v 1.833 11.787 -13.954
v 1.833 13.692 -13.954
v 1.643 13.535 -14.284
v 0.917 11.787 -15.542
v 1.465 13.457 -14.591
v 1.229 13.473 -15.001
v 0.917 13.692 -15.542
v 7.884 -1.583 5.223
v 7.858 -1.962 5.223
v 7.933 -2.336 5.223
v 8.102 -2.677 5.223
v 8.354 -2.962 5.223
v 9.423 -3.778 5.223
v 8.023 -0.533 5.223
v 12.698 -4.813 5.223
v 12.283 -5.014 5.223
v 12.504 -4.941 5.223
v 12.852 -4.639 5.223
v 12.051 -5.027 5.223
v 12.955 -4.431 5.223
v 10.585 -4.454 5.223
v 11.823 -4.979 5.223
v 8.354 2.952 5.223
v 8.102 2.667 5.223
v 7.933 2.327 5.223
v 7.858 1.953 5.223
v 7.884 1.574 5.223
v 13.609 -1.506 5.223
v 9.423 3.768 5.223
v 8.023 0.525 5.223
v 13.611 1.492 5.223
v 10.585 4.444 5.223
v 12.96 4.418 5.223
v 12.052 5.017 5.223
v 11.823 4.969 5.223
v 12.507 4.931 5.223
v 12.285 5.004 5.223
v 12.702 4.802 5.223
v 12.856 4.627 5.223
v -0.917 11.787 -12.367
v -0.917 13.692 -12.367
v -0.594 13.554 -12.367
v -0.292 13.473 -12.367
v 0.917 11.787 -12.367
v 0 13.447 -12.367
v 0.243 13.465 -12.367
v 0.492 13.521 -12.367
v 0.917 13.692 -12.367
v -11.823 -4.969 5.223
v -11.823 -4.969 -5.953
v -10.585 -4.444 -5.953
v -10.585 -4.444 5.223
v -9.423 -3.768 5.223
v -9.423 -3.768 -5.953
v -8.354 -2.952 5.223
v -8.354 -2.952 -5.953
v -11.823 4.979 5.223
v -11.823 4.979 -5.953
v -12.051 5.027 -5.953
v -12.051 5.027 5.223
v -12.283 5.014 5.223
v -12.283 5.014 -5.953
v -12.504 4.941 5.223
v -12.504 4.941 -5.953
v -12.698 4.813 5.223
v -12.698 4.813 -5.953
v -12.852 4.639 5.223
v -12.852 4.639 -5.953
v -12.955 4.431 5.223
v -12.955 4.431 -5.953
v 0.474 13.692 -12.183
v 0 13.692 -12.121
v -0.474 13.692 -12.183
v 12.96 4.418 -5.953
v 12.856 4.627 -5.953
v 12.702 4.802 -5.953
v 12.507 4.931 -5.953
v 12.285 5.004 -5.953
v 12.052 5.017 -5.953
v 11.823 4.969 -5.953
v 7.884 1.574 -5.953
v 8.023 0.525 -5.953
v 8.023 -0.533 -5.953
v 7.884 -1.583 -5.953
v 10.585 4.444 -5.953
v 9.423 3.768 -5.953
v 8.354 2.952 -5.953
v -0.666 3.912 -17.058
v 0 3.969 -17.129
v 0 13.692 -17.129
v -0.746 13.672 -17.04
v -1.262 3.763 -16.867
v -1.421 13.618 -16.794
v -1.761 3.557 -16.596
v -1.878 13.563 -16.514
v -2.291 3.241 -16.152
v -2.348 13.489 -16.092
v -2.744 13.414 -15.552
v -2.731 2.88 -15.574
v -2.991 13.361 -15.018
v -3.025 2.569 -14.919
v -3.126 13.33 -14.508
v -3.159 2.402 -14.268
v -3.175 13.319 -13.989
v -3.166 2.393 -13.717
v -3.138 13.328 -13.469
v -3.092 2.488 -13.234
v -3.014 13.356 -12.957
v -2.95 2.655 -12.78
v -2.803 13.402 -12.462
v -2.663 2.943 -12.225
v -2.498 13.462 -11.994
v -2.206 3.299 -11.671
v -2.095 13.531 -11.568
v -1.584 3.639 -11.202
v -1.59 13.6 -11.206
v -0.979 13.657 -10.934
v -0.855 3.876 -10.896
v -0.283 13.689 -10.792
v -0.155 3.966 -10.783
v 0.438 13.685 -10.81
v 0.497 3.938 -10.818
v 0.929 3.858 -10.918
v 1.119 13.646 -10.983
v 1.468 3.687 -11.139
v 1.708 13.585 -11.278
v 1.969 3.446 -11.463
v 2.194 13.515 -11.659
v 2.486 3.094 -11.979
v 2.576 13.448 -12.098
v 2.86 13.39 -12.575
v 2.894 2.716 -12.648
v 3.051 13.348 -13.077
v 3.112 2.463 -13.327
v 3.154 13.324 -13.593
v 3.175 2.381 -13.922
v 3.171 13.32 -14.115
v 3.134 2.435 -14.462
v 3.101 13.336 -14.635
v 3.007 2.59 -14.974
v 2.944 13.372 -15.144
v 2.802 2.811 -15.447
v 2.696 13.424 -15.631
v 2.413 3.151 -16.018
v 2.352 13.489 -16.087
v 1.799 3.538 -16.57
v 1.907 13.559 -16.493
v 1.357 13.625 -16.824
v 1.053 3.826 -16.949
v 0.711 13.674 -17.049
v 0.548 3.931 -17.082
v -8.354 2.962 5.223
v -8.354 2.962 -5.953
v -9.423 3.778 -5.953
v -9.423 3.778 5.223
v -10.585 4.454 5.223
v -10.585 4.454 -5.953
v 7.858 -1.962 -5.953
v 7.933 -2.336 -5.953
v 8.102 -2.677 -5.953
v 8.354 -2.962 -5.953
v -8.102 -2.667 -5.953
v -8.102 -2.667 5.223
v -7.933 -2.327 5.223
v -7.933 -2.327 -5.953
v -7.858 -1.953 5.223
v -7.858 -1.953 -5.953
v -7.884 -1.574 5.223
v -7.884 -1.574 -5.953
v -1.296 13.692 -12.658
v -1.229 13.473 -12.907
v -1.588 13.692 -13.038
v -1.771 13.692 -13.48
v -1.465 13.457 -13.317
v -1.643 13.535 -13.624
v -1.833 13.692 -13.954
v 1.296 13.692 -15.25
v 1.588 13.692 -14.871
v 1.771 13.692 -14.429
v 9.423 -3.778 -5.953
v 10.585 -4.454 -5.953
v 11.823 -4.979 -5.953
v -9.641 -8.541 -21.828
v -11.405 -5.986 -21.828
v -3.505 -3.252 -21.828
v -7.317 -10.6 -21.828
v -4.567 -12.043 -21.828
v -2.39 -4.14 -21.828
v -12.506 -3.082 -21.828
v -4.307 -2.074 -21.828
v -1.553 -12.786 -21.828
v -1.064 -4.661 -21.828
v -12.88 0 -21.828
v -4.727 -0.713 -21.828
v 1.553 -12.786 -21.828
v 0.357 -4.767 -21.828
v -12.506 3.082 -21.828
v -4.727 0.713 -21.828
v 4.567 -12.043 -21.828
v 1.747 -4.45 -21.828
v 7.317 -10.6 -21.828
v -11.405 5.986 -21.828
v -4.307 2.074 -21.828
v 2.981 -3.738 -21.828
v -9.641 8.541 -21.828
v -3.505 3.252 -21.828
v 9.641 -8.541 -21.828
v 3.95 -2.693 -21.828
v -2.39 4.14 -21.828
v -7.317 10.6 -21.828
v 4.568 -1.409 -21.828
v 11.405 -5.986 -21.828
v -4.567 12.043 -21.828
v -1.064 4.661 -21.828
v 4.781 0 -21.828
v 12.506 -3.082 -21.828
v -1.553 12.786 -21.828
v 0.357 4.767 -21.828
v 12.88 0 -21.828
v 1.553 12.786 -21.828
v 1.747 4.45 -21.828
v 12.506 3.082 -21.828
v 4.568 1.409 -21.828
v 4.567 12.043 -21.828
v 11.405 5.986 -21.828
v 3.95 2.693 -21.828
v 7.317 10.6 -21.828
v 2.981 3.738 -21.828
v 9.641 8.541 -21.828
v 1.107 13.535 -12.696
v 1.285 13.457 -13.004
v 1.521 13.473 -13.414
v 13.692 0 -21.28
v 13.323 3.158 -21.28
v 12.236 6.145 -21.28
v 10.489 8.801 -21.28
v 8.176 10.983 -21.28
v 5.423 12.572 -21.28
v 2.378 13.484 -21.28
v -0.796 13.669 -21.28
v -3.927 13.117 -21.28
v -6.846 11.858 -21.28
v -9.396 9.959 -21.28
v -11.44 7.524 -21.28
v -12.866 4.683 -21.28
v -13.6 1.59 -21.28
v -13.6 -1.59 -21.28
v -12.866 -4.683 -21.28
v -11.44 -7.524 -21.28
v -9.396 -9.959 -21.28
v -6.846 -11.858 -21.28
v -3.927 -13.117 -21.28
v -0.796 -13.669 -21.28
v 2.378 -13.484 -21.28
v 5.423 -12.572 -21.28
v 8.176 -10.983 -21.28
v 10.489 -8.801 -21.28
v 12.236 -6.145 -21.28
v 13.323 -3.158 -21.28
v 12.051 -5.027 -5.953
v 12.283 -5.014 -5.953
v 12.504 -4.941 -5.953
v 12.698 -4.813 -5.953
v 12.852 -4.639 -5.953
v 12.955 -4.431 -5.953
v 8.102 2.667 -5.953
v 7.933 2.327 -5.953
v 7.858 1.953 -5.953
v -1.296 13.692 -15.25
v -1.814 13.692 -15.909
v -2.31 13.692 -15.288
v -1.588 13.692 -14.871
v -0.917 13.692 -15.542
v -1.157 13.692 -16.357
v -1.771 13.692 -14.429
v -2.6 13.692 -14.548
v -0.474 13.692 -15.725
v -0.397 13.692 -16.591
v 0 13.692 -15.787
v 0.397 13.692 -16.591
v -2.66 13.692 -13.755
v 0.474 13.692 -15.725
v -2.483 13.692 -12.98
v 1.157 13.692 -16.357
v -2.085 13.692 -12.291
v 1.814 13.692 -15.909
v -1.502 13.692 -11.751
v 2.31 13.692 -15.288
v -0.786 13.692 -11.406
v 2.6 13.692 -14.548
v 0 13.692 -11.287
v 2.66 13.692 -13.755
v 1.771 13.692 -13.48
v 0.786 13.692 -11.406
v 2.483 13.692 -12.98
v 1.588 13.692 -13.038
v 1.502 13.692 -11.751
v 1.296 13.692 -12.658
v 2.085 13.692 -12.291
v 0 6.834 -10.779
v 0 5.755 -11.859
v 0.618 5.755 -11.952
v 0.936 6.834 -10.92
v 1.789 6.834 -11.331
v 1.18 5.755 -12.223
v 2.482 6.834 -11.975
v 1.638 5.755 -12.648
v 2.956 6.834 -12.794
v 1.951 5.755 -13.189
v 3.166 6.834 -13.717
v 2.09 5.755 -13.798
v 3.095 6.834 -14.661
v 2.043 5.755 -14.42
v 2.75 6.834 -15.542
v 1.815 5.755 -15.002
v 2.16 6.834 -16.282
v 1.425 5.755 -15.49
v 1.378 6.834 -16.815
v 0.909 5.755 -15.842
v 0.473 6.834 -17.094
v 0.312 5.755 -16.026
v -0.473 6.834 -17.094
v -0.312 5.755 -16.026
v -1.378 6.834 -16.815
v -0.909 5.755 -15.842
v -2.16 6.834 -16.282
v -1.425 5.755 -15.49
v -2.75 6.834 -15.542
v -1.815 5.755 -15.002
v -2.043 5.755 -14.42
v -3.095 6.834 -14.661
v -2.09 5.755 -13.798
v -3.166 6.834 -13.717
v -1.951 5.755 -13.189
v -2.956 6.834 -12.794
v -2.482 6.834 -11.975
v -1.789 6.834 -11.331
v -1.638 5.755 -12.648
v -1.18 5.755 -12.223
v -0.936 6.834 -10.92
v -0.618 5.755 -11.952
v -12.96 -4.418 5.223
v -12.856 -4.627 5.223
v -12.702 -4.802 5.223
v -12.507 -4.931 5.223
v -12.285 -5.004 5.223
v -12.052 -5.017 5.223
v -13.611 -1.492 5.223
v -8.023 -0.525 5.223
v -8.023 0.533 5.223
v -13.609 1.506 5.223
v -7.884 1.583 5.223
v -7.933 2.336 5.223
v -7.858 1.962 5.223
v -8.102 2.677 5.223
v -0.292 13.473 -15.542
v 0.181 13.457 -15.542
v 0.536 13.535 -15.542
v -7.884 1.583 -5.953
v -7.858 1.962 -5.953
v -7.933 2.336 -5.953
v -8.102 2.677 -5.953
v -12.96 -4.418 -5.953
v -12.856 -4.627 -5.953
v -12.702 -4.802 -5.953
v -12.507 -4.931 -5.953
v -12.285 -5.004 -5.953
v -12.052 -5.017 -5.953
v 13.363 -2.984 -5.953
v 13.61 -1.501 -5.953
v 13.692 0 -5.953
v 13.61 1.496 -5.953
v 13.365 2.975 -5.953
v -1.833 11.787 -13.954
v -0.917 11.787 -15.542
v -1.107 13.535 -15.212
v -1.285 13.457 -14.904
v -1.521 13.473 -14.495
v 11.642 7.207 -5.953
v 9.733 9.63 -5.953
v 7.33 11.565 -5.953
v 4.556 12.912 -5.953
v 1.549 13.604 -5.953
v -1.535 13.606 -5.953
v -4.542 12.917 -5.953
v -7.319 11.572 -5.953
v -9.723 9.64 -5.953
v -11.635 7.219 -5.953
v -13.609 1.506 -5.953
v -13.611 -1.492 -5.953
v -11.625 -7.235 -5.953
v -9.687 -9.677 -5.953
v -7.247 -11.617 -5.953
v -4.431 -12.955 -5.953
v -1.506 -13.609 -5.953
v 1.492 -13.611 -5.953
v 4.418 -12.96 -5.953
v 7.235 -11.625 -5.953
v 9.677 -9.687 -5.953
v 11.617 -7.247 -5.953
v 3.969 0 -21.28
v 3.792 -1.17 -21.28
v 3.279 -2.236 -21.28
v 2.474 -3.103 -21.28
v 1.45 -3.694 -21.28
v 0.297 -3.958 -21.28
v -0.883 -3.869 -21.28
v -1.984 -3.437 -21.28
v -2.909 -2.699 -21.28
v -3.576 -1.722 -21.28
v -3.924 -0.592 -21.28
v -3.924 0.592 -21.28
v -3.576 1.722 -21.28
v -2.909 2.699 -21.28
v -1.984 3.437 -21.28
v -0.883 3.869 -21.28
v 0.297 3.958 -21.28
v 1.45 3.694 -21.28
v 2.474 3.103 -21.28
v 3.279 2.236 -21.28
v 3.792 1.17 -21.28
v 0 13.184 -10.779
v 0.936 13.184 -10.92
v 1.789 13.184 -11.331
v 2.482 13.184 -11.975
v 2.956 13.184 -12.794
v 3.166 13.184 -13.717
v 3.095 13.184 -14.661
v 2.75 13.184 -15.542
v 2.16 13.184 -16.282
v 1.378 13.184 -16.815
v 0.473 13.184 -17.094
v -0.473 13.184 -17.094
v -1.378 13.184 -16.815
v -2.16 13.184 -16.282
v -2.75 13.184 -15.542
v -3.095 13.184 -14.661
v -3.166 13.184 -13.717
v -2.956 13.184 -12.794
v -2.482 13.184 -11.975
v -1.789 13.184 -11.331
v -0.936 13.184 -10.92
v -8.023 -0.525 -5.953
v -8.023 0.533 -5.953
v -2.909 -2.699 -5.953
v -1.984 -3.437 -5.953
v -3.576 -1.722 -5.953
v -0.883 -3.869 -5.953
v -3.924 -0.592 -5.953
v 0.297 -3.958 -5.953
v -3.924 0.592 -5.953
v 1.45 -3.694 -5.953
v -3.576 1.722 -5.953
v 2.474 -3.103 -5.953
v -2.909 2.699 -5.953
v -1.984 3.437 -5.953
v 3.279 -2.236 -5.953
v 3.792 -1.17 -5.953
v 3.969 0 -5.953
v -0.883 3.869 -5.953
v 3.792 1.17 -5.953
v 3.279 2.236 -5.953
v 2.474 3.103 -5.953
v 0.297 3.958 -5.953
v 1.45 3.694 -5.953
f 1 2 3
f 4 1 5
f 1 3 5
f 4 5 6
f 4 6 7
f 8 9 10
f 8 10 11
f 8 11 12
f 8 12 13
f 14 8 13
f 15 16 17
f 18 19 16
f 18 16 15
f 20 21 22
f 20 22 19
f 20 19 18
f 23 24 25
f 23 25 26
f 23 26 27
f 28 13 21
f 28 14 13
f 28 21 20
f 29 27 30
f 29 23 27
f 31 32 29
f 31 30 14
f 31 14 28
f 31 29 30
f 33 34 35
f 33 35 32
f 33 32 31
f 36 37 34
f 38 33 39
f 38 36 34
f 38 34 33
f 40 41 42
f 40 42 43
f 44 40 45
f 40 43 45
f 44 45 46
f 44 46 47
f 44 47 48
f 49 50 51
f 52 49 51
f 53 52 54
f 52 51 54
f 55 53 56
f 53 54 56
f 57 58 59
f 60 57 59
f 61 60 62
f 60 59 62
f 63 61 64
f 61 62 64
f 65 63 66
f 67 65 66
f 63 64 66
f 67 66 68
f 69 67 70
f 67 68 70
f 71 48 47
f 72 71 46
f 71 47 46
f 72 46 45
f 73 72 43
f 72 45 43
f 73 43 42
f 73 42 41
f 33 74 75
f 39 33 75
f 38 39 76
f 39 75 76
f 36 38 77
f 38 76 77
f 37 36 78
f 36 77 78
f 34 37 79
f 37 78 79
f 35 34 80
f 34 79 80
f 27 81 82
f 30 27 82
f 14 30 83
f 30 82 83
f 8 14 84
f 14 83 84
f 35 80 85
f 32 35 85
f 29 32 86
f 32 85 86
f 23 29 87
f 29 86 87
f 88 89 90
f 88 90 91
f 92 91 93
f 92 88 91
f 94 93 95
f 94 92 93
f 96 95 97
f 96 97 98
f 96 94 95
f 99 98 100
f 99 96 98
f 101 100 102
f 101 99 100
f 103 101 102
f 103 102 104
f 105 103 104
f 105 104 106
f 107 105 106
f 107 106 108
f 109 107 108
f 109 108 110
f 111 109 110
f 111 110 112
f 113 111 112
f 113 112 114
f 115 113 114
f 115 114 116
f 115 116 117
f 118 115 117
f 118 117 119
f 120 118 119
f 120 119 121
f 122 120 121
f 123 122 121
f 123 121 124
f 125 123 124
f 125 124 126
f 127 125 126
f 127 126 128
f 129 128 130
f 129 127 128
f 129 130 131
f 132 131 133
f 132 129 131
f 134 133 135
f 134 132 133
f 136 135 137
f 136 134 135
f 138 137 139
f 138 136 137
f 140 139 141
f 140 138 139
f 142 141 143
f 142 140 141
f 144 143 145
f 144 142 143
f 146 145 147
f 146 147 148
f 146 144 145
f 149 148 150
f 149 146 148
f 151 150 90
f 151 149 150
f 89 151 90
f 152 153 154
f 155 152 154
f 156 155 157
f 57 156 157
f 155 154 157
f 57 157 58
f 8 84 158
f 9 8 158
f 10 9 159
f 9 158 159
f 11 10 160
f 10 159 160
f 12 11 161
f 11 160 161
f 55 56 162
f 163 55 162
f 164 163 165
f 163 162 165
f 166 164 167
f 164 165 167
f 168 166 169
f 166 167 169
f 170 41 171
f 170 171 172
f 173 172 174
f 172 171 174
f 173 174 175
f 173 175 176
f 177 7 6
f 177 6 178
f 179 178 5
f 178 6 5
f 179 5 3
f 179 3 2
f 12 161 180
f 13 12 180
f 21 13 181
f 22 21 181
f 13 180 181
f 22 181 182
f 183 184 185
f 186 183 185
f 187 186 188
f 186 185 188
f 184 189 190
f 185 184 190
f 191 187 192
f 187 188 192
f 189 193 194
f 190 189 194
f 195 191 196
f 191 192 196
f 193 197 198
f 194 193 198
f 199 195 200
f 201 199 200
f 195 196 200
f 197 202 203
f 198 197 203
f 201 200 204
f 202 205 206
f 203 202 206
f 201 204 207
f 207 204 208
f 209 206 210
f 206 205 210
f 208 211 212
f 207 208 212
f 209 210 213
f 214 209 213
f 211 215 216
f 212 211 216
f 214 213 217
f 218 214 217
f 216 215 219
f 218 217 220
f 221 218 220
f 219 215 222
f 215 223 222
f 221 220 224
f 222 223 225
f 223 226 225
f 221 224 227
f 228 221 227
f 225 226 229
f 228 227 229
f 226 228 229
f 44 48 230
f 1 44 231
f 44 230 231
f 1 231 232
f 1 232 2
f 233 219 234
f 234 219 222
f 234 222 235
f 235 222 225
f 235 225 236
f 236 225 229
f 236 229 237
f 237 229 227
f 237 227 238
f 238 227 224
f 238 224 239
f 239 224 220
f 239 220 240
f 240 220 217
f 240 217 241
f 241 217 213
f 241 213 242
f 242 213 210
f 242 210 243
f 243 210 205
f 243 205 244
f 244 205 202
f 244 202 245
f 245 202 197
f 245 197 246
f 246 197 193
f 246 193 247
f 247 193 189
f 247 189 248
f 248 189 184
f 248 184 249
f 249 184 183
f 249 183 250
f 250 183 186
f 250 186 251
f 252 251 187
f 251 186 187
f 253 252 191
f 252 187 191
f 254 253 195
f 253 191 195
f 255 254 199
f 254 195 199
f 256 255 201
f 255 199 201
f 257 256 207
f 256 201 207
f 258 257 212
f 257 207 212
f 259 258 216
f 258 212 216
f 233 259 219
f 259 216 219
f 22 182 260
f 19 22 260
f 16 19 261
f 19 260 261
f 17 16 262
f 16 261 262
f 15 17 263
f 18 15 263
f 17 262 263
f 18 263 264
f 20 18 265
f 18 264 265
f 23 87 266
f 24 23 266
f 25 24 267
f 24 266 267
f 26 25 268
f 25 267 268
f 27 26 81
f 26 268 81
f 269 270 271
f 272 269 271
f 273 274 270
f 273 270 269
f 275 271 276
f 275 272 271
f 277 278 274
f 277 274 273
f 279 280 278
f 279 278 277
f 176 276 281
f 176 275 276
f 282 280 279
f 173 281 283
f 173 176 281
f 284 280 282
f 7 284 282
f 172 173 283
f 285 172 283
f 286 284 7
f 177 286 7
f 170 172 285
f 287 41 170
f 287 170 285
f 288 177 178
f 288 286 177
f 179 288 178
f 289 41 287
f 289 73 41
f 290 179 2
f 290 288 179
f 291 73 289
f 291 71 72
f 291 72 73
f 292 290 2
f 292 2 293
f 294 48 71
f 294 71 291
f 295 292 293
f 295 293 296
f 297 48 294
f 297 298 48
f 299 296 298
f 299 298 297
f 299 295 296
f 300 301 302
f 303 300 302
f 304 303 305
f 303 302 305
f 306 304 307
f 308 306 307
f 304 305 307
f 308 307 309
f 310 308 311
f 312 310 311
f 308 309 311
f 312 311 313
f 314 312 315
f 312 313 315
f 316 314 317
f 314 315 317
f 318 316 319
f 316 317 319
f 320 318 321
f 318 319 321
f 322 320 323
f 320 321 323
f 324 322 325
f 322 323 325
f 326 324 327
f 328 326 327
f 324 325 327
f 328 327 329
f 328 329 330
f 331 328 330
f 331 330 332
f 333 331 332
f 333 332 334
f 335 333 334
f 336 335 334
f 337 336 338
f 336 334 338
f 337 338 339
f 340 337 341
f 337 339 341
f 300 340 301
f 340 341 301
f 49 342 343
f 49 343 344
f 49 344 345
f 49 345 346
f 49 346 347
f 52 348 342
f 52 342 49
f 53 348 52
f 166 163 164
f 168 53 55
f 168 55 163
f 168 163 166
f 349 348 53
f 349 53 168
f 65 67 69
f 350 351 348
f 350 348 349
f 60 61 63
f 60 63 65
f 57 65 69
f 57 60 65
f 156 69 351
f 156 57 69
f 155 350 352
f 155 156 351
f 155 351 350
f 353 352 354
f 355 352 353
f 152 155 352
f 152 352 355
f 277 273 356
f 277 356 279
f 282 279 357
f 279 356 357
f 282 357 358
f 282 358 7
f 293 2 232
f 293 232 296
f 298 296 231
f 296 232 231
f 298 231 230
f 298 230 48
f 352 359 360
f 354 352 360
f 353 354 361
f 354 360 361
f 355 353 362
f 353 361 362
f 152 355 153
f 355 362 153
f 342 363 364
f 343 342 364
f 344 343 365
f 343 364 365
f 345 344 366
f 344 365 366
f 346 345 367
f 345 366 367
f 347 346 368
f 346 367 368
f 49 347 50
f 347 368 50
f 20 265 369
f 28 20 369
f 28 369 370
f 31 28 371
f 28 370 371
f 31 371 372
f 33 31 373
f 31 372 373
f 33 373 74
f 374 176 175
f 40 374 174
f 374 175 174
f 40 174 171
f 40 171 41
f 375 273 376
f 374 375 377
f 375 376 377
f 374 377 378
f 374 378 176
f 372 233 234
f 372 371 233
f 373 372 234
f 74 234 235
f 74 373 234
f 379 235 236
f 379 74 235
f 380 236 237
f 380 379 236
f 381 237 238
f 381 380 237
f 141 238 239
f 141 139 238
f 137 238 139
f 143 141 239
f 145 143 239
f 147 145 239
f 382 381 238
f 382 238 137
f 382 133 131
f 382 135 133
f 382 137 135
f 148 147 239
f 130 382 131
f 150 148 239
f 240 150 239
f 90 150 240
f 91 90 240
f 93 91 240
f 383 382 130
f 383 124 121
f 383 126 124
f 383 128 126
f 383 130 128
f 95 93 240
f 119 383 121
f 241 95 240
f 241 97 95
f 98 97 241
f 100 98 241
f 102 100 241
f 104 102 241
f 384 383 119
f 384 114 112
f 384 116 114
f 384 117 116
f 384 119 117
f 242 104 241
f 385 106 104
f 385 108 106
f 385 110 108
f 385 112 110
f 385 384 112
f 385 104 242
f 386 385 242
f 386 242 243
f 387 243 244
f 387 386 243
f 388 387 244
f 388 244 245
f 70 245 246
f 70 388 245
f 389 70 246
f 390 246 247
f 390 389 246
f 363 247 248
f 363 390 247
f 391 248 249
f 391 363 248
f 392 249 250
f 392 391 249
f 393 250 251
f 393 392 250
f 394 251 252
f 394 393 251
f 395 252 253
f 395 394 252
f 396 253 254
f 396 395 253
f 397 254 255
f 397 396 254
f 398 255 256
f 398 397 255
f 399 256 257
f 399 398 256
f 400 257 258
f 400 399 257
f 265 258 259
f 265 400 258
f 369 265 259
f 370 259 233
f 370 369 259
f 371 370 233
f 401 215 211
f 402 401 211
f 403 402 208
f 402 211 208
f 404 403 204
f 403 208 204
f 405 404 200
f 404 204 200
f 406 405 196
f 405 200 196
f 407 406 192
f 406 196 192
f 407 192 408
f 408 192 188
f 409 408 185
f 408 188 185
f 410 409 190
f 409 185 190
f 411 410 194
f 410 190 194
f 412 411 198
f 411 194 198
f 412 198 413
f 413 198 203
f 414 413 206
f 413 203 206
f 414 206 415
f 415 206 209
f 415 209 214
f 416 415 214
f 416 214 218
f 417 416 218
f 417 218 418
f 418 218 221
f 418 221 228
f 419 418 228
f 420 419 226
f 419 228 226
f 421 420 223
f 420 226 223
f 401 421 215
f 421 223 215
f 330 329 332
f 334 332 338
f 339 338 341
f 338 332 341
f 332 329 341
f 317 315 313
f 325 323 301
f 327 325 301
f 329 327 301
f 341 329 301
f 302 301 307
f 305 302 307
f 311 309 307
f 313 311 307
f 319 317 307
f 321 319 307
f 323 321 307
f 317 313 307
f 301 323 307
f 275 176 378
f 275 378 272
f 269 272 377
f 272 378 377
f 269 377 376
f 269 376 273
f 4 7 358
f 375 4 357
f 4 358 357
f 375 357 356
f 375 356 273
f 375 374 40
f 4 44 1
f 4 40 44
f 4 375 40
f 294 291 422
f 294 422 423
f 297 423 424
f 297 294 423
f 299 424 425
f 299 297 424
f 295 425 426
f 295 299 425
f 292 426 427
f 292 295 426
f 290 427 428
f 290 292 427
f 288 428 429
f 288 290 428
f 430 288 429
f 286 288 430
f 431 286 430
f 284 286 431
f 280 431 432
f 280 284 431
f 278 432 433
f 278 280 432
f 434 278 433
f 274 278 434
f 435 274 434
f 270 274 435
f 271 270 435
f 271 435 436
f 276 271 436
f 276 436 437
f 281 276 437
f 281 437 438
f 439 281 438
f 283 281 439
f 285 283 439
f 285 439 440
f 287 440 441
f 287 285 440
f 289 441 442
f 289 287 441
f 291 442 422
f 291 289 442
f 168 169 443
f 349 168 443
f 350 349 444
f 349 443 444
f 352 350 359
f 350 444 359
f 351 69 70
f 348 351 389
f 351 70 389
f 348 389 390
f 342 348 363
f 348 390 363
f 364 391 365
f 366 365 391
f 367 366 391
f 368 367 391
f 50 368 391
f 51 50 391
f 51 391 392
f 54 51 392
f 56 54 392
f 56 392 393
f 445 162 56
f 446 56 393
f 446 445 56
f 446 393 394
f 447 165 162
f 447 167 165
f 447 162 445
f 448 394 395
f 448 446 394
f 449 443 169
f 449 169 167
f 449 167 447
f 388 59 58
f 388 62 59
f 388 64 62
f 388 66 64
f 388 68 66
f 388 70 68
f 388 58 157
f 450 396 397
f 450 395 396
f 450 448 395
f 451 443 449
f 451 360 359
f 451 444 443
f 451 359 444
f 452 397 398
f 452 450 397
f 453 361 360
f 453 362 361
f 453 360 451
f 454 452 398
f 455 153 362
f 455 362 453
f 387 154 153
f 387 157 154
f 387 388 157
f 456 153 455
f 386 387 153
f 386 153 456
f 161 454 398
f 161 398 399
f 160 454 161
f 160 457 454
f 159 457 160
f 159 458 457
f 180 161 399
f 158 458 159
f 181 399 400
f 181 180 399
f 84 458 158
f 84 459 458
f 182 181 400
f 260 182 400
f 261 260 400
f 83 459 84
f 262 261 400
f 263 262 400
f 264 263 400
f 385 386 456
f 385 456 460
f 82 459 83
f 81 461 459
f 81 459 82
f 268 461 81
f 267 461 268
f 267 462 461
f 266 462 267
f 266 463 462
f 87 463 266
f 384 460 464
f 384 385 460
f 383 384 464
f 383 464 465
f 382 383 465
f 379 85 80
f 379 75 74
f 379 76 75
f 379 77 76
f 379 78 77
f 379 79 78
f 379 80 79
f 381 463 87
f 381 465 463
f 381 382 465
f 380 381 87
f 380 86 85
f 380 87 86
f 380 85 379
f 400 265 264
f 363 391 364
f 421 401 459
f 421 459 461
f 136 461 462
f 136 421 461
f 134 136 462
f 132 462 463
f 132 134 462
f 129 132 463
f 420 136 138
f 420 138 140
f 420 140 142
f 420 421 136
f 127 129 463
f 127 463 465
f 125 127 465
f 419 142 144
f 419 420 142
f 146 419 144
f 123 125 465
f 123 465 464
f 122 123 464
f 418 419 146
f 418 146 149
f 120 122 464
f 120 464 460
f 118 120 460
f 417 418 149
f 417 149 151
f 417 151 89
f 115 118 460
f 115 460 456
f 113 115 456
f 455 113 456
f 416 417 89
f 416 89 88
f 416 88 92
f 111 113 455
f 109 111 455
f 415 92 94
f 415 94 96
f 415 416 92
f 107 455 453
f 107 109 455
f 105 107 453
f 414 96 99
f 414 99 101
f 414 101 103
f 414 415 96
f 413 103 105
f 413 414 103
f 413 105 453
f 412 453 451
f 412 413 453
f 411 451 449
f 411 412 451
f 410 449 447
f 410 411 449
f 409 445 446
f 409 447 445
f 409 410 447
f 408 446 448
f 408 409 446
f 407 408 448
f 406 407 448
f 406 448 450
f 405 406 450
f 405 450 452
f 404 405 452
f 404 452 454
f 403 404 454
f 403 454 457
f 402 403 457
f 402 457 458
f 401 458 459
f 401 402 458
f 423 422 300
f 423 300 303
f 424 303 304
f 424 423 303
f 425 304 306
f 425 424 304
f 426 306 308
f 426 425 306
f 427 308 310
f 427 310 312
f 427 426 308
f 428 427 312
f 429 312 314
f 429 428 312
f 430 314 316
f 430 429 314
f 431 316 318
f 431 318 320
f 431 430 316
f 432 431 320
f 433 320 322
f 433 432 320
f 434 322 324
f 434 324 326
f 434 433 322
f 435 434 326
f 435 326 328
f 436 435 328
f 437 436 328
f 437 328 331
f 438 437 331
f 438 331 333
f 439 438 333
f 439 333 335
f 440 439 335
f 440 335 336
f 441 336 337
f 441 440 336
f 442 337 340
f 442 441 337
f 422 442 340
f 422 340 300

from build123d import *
from OCP.BRepFilletAPI import BRepFilletAPI_MakeChamfer

# Parameters (mm, degrees)
BOSS_EXTRUDE1_START     = -5.953125
SKETCH1_R               = 13.6921875
BOSS_EXTRUDE1_DEPTH     = 15.875
BOSS_EXTRUDE5_START     = 11.176
BOSS_EXTRUDE5_DEPTH     = 11.176
MOVE_START              = -5.953125
MOVE_FACE1_DEPTH        = 11.176
MOVE_FACE1_2_DEPTH      = 11.176
CIRPATTERN3_START       = -5.953125
CIRPATTERN3_DEPTH       = 11.176
CUT_EXTRUDE5_DEPTH      = 30.179085628
CUT_EXTRUDE5_DEPTH_BACK = 30.179085628
SKETCH15_R              = 3.96875
CHAMFER1_SIZE           = 0.5476875
CHAMFER1_SIZE2          = 0.81198011
SKETCH5_R               = 3.175
CUT_EXTRUDE2_DEPTH      = 30.179085628
SKETCH6_R               = 3.175
BOSS_EXTRUDE3_DEPTH     = 7.9375
CUT_EXTRUDE3_DEPTH      = 1.905
CHAMFER3_SIZE           = 0.508
CHAMFER4_SIZE           = 1.0795


# Read off the part's stored shape, not the designer's step: Move Face1, CirPattern3
with BuildPart() as part:
    # Sketch1 → Boss-Extrude1 (new body)
    with BuildSketch(Plane.XY.offset(BOSS_EXTRUDE1_START)):
        Circle(SKETCH1_R)
    extrude(amount=-BOSS_EXTRUDE1_DEPTH)

    # Sketch11 → Boss-Extrude5 (add)
    with BuildSketch(Plane.XY.offset(-5.953125).offset(BOSS_EXTRUDE5_START)):
        with BuildLine():
            ThreePointArc((-1.582501, -7.883505579), (-0.004369034, -8.040686324), (1.573762932, -7.883505579))
            ThreePointArc((1.573762932, -7.883505579), (2.326569083, -7.932638836), (2.952339417, -8.353996958))
            ThreePointArc((2.952339417, -8.353996958), (4.124174772, -9.993538922), (4.969226713, -11.823069782))
            ThreePointArc((4.969226713, -11.823069782), (4.930575443, -12.50660364), (4.417578974, -12.959976641))
            ThreePointArc((4.417578974, -12.959976641), (-0.006979455, -13.692185721), (-4.430789112, -12.955466274))
            ThreePointArc((-4.430789112, -12.955466274), (-4.941191352, -12.503649266), (-4.979409431, -11.823069782))
            ThreePointArc((-4.979409431, -11.823069782), (-4.13390788, -9.993483356), (-2.961583815, -8.353996958))
            ThreePointArc((-2.961583815, -8.353996958), (-2.335546152, -7.932611995), (-1.582501, -7.883505579))
        make_face()
    extrude(amount=-BOSS_EXTRUDE5_DEPTH)

    # Move Face1 outline → Move Face1 (cut)
    with BuildSketch(Plane.XY.offset(MOVE_START)):
        with BuildLine():
            ThreePointArc((-4.430789112, -12.955466274), (-0.006979455, -13.692185721), (4.417578974, -12.959976641))
            ThreePointArc((4.417578974, -12.959976641), (4.930575443, -12.50660364), (4.969226713, -11.823069782))
            ThreePointArc((4.969226713, -11.823069782), (4.124174772, -9.993538922), (2.952339417, -8.353996958))
            ThreePointArc((2.952339417, -8.353996958), (2.326569083, -7.932638836), (1.573762932, -7.883505579))
            ThreePointArc((1.573762932, -7.883505579), (-0.004369034, -8.040686324), (-1.582501, -7.883505579))
            ThreePointArc((-1.582501, -7.883505579), (-2.335546152, -7.932611995), (-2.961583815, -8.353996958))
            ThreePointArc((-2.961583815, -8.353996958), (-4.13390788, -9.993483356), (-4.979409431, -11.823069782))
            ThreePointArc((-4.979409431, -11.823069782), (-4.941191352, -12.503649266), (-4.430789112, -12.955466274))
        make_face()
    extrude(amount=MOVE_FACE1_DEPTH, mode=Mode.SUBTRACT)

    # Move Face1 2 outline → Move Face1 2 (add)
    with BuildSketch(Plane.XY.offset(MOVE_START)):
        with BuildLine():
            ThreePointArc((7.883505579, -1.582501), (7.932611995, -2.335546152), (8.353996958, -2.961583815))
            ThreePointArc((8.353996958, -2.961583815), (9.993483356, -4.13390788), (11.823069782, -4.979409431))
            ThreePointArc((11.823069782, -4.979409431), (12.503649266, -4.941191352), (12.955466274, -4.430789112))
            ThreePointArc((12.955466274, -4.430789112), (13.692185721, -0.006979455), (12.959976641, 4.417578974))
            ThreePointArc((12.959976641, 4.417578974), (12.50660364, 4.930575443), (11.823069782, 4.969226713))
            ThreePointArc((11.823069782, 4.969226713), (9.993538922, 4.124174772), (8.353996958, 2.952339417))
            ThreePointArc((8.353996958, 2.952339417), (7.932638836, 2.326569083), (7.883505579, 1.573762932))
            ThreePointArc((7.883505579, 1.573762932), (8.040686324, -0.004369034), (7.883505579, -1.582501))
        make_face()
    extrude(amount=MOVE_FACE1_2_DEPTH)

    # CirPattern3 outline → CirPattern3 (add)
    with BuildSketch(Plane.XY.offset(CIRPATTERN3_START)):
        with BuildLine():
            ThreePointArc((-7.883505579, 1.582501), (-7.932611995, 2.335546152), (-8.353996958, 2.961583815))
            ThreePointArc((-8.353996958, 2.961583815), (-9.993483356, 4.13390788), (-11.823069782, 4.979409431))
            ThreePointArc((-11.823069782, 4.979409431), (-12.503649266, 4.941191352), (-12.955466274, 4.430789112))
            ThreePointArc((-12.955466274, 4.430789112), (-13.692185721, 0.006979455), (-12.959976641, -4.417578974))
            ThreePointArc((-12.959976641, -4.417578974), (-12.50660364, -4.930575443), (-11.823069782, -4.969226713))
            ThreePointArc((-11.823069782, -4.969226713), (-9.993538922, -4.124174772), (-8.353996958, -2.952339417))
            ThreePointArc((-8.353996958, -2.952339417), (-7.932638836, -2.326569083), (-7.883505579, -1.573762932))
            ThreePointArc((-7.883505579, -1.573762932), (-8.040686324, 0.004369034), (-7.883505579, 1.582501))
        make_face()
    extrude(amount=CIRPATTERN3_DEPTH)

    # Sketch15 → Cut-Extrude5 (cut, two sides: drawn at the far end of the back side and taken through both)
    with BuildSketch(Plane.XY.offset(-CUT_EXTRUDE5_DEPTH_BACK)):
        Circle(SKETCH15_R)
    extrude(amount=CUT_EXTRUDE5_DEPTH + CUT_EXTRUDE5_DEPTH_BACK, mode=Mode.SUBTRACT)

    # Chamfer1: one chamfer whose edges measure the first distance from different faces: ONE call of the kernel's chamfer builder (chamfer() names one face for all edges)
    chamfer1_edges_1 = [part.edges().sort_by_distance(p)[0] for p in [
        (-13.6921875, 0, -21.828125),
    ]]
    chamfer1_side_1 = [part.faces().sort_by_distance(p)[0] for p in [
        (-13.6921875, 0, -13.890625),
    ]]
    chamfer1_edges_2 = [part.edges().sort_by_distance(p)[0] for p in [
        (-3.96875, 0, -21.828125),
    ]]
    chamfer1_side_2 = [part.faces().sort_by_distance(p)[0] for p in [
        (-3.96875, 0, -13.890625),
    ]]
    chamfer1 = BRepFilletAPI_MakeChamfer(part.part.solid().wrapped)
    for e in chamfer1_edges_1:
        chamfer1.Add(CHAMFER1_SIZE, CHAMFER1_SIZE2, e.wrapped, chamfer1_side_1[0].wrapped)  # the first distance lies on this face
    for e in chamfer1_edges_2:
        chamfer1.Add(CHAMFER1_SIZE, CHAMFER1_SIZE2, e.wrapped, chamfer1_side_2[0].wrapped)  # the first distance lies on this face
    add(Compound.cast(chamfer1.Shape()), mode=Mode.REPLACE)

    # Sketch5 → Cut-Extrude2 (cut, through all)
    with BuildSketch(Plane(origin=(0, 0, 0), x_dir=(1, 0, 0), z_dir=(0, 1, 0))):
        with Locations(Location((0, 13.954125, 0), (0, 0, 90))):
            Circle(SKETCH5_R)
    extrude(amount=CUT_EXTRUDE2_DEPTH, mode=Mode.SUBTRACT)


with BuildPart() as body_2:
    # Sketch6 → Boss-Extrude3 (new body)
    with BuildSketch(Plane(origin=(0, 13.6921875, 0), x_dir=(-1, 0, 0), z_dir=(0, 1, 0))):
        with Locations(Location((0, -13.954125, 0), (0, 0, 90))):
            Circle(SKETCH6_R)
    extrude(amount=-BOSS_EXTRUDE3_DEPTH)

    # Sketch8 → Cut-Extrude3 (cut)
    with BuildSketch(Plane(origin=(0, 13.6921875, 0), x_dir=(1, 0, 0), z_dir=(0, 1, 0))):
        Polygon((0.916543552, 12.366625), (1.833087105, 13.954125), (0.916543552, 15.541625), (-0.916543552, 15.541625), (-1.833087105, 13.954125), (-0.916543552, 12.366625), align=None)
    extrude(amount=-CUT_EXTRUDE3_DEPTH, mode=Mode.SUBTRACT)

    # Cut-Extrude4 cone 1 section (through the dimple's axis) → Cut-Extrude4 (revolve, cut)
    with BuildSketch(Plane(origin=(0, 13.6921875, -13.954125), x_dir=(0, 0, 1), z_dir=(1, 0, 0))):
        Polygon((0, 0), (1.833087105, 0), (0, 1.833087105), align=None)
    revolve(axis=Axis((0, 13.6921875, -13.954125), (0, -1, 0)), mode=Mode.SUBTRACT)

    # Chamfer3
    chamfer3_edges = [body_2.edges().sort_by_distance(p)[0] for p in [
        (0, 13.6921875, -17.129125),
    ]]
    chamfer(chamfer3_edges, length=CHAMFER3_SIZE)

    # Chamfer4
    chamfer4_edges = [body_2.edges().sort_by_distance(p)[0] for p in [
        (0, 5.7546875, -17.129125),
    ]]
    chamfer(chamfer4_edges, length=CHAMFER4_SIZE)


solid = Compound([part.part, body_2.part])
